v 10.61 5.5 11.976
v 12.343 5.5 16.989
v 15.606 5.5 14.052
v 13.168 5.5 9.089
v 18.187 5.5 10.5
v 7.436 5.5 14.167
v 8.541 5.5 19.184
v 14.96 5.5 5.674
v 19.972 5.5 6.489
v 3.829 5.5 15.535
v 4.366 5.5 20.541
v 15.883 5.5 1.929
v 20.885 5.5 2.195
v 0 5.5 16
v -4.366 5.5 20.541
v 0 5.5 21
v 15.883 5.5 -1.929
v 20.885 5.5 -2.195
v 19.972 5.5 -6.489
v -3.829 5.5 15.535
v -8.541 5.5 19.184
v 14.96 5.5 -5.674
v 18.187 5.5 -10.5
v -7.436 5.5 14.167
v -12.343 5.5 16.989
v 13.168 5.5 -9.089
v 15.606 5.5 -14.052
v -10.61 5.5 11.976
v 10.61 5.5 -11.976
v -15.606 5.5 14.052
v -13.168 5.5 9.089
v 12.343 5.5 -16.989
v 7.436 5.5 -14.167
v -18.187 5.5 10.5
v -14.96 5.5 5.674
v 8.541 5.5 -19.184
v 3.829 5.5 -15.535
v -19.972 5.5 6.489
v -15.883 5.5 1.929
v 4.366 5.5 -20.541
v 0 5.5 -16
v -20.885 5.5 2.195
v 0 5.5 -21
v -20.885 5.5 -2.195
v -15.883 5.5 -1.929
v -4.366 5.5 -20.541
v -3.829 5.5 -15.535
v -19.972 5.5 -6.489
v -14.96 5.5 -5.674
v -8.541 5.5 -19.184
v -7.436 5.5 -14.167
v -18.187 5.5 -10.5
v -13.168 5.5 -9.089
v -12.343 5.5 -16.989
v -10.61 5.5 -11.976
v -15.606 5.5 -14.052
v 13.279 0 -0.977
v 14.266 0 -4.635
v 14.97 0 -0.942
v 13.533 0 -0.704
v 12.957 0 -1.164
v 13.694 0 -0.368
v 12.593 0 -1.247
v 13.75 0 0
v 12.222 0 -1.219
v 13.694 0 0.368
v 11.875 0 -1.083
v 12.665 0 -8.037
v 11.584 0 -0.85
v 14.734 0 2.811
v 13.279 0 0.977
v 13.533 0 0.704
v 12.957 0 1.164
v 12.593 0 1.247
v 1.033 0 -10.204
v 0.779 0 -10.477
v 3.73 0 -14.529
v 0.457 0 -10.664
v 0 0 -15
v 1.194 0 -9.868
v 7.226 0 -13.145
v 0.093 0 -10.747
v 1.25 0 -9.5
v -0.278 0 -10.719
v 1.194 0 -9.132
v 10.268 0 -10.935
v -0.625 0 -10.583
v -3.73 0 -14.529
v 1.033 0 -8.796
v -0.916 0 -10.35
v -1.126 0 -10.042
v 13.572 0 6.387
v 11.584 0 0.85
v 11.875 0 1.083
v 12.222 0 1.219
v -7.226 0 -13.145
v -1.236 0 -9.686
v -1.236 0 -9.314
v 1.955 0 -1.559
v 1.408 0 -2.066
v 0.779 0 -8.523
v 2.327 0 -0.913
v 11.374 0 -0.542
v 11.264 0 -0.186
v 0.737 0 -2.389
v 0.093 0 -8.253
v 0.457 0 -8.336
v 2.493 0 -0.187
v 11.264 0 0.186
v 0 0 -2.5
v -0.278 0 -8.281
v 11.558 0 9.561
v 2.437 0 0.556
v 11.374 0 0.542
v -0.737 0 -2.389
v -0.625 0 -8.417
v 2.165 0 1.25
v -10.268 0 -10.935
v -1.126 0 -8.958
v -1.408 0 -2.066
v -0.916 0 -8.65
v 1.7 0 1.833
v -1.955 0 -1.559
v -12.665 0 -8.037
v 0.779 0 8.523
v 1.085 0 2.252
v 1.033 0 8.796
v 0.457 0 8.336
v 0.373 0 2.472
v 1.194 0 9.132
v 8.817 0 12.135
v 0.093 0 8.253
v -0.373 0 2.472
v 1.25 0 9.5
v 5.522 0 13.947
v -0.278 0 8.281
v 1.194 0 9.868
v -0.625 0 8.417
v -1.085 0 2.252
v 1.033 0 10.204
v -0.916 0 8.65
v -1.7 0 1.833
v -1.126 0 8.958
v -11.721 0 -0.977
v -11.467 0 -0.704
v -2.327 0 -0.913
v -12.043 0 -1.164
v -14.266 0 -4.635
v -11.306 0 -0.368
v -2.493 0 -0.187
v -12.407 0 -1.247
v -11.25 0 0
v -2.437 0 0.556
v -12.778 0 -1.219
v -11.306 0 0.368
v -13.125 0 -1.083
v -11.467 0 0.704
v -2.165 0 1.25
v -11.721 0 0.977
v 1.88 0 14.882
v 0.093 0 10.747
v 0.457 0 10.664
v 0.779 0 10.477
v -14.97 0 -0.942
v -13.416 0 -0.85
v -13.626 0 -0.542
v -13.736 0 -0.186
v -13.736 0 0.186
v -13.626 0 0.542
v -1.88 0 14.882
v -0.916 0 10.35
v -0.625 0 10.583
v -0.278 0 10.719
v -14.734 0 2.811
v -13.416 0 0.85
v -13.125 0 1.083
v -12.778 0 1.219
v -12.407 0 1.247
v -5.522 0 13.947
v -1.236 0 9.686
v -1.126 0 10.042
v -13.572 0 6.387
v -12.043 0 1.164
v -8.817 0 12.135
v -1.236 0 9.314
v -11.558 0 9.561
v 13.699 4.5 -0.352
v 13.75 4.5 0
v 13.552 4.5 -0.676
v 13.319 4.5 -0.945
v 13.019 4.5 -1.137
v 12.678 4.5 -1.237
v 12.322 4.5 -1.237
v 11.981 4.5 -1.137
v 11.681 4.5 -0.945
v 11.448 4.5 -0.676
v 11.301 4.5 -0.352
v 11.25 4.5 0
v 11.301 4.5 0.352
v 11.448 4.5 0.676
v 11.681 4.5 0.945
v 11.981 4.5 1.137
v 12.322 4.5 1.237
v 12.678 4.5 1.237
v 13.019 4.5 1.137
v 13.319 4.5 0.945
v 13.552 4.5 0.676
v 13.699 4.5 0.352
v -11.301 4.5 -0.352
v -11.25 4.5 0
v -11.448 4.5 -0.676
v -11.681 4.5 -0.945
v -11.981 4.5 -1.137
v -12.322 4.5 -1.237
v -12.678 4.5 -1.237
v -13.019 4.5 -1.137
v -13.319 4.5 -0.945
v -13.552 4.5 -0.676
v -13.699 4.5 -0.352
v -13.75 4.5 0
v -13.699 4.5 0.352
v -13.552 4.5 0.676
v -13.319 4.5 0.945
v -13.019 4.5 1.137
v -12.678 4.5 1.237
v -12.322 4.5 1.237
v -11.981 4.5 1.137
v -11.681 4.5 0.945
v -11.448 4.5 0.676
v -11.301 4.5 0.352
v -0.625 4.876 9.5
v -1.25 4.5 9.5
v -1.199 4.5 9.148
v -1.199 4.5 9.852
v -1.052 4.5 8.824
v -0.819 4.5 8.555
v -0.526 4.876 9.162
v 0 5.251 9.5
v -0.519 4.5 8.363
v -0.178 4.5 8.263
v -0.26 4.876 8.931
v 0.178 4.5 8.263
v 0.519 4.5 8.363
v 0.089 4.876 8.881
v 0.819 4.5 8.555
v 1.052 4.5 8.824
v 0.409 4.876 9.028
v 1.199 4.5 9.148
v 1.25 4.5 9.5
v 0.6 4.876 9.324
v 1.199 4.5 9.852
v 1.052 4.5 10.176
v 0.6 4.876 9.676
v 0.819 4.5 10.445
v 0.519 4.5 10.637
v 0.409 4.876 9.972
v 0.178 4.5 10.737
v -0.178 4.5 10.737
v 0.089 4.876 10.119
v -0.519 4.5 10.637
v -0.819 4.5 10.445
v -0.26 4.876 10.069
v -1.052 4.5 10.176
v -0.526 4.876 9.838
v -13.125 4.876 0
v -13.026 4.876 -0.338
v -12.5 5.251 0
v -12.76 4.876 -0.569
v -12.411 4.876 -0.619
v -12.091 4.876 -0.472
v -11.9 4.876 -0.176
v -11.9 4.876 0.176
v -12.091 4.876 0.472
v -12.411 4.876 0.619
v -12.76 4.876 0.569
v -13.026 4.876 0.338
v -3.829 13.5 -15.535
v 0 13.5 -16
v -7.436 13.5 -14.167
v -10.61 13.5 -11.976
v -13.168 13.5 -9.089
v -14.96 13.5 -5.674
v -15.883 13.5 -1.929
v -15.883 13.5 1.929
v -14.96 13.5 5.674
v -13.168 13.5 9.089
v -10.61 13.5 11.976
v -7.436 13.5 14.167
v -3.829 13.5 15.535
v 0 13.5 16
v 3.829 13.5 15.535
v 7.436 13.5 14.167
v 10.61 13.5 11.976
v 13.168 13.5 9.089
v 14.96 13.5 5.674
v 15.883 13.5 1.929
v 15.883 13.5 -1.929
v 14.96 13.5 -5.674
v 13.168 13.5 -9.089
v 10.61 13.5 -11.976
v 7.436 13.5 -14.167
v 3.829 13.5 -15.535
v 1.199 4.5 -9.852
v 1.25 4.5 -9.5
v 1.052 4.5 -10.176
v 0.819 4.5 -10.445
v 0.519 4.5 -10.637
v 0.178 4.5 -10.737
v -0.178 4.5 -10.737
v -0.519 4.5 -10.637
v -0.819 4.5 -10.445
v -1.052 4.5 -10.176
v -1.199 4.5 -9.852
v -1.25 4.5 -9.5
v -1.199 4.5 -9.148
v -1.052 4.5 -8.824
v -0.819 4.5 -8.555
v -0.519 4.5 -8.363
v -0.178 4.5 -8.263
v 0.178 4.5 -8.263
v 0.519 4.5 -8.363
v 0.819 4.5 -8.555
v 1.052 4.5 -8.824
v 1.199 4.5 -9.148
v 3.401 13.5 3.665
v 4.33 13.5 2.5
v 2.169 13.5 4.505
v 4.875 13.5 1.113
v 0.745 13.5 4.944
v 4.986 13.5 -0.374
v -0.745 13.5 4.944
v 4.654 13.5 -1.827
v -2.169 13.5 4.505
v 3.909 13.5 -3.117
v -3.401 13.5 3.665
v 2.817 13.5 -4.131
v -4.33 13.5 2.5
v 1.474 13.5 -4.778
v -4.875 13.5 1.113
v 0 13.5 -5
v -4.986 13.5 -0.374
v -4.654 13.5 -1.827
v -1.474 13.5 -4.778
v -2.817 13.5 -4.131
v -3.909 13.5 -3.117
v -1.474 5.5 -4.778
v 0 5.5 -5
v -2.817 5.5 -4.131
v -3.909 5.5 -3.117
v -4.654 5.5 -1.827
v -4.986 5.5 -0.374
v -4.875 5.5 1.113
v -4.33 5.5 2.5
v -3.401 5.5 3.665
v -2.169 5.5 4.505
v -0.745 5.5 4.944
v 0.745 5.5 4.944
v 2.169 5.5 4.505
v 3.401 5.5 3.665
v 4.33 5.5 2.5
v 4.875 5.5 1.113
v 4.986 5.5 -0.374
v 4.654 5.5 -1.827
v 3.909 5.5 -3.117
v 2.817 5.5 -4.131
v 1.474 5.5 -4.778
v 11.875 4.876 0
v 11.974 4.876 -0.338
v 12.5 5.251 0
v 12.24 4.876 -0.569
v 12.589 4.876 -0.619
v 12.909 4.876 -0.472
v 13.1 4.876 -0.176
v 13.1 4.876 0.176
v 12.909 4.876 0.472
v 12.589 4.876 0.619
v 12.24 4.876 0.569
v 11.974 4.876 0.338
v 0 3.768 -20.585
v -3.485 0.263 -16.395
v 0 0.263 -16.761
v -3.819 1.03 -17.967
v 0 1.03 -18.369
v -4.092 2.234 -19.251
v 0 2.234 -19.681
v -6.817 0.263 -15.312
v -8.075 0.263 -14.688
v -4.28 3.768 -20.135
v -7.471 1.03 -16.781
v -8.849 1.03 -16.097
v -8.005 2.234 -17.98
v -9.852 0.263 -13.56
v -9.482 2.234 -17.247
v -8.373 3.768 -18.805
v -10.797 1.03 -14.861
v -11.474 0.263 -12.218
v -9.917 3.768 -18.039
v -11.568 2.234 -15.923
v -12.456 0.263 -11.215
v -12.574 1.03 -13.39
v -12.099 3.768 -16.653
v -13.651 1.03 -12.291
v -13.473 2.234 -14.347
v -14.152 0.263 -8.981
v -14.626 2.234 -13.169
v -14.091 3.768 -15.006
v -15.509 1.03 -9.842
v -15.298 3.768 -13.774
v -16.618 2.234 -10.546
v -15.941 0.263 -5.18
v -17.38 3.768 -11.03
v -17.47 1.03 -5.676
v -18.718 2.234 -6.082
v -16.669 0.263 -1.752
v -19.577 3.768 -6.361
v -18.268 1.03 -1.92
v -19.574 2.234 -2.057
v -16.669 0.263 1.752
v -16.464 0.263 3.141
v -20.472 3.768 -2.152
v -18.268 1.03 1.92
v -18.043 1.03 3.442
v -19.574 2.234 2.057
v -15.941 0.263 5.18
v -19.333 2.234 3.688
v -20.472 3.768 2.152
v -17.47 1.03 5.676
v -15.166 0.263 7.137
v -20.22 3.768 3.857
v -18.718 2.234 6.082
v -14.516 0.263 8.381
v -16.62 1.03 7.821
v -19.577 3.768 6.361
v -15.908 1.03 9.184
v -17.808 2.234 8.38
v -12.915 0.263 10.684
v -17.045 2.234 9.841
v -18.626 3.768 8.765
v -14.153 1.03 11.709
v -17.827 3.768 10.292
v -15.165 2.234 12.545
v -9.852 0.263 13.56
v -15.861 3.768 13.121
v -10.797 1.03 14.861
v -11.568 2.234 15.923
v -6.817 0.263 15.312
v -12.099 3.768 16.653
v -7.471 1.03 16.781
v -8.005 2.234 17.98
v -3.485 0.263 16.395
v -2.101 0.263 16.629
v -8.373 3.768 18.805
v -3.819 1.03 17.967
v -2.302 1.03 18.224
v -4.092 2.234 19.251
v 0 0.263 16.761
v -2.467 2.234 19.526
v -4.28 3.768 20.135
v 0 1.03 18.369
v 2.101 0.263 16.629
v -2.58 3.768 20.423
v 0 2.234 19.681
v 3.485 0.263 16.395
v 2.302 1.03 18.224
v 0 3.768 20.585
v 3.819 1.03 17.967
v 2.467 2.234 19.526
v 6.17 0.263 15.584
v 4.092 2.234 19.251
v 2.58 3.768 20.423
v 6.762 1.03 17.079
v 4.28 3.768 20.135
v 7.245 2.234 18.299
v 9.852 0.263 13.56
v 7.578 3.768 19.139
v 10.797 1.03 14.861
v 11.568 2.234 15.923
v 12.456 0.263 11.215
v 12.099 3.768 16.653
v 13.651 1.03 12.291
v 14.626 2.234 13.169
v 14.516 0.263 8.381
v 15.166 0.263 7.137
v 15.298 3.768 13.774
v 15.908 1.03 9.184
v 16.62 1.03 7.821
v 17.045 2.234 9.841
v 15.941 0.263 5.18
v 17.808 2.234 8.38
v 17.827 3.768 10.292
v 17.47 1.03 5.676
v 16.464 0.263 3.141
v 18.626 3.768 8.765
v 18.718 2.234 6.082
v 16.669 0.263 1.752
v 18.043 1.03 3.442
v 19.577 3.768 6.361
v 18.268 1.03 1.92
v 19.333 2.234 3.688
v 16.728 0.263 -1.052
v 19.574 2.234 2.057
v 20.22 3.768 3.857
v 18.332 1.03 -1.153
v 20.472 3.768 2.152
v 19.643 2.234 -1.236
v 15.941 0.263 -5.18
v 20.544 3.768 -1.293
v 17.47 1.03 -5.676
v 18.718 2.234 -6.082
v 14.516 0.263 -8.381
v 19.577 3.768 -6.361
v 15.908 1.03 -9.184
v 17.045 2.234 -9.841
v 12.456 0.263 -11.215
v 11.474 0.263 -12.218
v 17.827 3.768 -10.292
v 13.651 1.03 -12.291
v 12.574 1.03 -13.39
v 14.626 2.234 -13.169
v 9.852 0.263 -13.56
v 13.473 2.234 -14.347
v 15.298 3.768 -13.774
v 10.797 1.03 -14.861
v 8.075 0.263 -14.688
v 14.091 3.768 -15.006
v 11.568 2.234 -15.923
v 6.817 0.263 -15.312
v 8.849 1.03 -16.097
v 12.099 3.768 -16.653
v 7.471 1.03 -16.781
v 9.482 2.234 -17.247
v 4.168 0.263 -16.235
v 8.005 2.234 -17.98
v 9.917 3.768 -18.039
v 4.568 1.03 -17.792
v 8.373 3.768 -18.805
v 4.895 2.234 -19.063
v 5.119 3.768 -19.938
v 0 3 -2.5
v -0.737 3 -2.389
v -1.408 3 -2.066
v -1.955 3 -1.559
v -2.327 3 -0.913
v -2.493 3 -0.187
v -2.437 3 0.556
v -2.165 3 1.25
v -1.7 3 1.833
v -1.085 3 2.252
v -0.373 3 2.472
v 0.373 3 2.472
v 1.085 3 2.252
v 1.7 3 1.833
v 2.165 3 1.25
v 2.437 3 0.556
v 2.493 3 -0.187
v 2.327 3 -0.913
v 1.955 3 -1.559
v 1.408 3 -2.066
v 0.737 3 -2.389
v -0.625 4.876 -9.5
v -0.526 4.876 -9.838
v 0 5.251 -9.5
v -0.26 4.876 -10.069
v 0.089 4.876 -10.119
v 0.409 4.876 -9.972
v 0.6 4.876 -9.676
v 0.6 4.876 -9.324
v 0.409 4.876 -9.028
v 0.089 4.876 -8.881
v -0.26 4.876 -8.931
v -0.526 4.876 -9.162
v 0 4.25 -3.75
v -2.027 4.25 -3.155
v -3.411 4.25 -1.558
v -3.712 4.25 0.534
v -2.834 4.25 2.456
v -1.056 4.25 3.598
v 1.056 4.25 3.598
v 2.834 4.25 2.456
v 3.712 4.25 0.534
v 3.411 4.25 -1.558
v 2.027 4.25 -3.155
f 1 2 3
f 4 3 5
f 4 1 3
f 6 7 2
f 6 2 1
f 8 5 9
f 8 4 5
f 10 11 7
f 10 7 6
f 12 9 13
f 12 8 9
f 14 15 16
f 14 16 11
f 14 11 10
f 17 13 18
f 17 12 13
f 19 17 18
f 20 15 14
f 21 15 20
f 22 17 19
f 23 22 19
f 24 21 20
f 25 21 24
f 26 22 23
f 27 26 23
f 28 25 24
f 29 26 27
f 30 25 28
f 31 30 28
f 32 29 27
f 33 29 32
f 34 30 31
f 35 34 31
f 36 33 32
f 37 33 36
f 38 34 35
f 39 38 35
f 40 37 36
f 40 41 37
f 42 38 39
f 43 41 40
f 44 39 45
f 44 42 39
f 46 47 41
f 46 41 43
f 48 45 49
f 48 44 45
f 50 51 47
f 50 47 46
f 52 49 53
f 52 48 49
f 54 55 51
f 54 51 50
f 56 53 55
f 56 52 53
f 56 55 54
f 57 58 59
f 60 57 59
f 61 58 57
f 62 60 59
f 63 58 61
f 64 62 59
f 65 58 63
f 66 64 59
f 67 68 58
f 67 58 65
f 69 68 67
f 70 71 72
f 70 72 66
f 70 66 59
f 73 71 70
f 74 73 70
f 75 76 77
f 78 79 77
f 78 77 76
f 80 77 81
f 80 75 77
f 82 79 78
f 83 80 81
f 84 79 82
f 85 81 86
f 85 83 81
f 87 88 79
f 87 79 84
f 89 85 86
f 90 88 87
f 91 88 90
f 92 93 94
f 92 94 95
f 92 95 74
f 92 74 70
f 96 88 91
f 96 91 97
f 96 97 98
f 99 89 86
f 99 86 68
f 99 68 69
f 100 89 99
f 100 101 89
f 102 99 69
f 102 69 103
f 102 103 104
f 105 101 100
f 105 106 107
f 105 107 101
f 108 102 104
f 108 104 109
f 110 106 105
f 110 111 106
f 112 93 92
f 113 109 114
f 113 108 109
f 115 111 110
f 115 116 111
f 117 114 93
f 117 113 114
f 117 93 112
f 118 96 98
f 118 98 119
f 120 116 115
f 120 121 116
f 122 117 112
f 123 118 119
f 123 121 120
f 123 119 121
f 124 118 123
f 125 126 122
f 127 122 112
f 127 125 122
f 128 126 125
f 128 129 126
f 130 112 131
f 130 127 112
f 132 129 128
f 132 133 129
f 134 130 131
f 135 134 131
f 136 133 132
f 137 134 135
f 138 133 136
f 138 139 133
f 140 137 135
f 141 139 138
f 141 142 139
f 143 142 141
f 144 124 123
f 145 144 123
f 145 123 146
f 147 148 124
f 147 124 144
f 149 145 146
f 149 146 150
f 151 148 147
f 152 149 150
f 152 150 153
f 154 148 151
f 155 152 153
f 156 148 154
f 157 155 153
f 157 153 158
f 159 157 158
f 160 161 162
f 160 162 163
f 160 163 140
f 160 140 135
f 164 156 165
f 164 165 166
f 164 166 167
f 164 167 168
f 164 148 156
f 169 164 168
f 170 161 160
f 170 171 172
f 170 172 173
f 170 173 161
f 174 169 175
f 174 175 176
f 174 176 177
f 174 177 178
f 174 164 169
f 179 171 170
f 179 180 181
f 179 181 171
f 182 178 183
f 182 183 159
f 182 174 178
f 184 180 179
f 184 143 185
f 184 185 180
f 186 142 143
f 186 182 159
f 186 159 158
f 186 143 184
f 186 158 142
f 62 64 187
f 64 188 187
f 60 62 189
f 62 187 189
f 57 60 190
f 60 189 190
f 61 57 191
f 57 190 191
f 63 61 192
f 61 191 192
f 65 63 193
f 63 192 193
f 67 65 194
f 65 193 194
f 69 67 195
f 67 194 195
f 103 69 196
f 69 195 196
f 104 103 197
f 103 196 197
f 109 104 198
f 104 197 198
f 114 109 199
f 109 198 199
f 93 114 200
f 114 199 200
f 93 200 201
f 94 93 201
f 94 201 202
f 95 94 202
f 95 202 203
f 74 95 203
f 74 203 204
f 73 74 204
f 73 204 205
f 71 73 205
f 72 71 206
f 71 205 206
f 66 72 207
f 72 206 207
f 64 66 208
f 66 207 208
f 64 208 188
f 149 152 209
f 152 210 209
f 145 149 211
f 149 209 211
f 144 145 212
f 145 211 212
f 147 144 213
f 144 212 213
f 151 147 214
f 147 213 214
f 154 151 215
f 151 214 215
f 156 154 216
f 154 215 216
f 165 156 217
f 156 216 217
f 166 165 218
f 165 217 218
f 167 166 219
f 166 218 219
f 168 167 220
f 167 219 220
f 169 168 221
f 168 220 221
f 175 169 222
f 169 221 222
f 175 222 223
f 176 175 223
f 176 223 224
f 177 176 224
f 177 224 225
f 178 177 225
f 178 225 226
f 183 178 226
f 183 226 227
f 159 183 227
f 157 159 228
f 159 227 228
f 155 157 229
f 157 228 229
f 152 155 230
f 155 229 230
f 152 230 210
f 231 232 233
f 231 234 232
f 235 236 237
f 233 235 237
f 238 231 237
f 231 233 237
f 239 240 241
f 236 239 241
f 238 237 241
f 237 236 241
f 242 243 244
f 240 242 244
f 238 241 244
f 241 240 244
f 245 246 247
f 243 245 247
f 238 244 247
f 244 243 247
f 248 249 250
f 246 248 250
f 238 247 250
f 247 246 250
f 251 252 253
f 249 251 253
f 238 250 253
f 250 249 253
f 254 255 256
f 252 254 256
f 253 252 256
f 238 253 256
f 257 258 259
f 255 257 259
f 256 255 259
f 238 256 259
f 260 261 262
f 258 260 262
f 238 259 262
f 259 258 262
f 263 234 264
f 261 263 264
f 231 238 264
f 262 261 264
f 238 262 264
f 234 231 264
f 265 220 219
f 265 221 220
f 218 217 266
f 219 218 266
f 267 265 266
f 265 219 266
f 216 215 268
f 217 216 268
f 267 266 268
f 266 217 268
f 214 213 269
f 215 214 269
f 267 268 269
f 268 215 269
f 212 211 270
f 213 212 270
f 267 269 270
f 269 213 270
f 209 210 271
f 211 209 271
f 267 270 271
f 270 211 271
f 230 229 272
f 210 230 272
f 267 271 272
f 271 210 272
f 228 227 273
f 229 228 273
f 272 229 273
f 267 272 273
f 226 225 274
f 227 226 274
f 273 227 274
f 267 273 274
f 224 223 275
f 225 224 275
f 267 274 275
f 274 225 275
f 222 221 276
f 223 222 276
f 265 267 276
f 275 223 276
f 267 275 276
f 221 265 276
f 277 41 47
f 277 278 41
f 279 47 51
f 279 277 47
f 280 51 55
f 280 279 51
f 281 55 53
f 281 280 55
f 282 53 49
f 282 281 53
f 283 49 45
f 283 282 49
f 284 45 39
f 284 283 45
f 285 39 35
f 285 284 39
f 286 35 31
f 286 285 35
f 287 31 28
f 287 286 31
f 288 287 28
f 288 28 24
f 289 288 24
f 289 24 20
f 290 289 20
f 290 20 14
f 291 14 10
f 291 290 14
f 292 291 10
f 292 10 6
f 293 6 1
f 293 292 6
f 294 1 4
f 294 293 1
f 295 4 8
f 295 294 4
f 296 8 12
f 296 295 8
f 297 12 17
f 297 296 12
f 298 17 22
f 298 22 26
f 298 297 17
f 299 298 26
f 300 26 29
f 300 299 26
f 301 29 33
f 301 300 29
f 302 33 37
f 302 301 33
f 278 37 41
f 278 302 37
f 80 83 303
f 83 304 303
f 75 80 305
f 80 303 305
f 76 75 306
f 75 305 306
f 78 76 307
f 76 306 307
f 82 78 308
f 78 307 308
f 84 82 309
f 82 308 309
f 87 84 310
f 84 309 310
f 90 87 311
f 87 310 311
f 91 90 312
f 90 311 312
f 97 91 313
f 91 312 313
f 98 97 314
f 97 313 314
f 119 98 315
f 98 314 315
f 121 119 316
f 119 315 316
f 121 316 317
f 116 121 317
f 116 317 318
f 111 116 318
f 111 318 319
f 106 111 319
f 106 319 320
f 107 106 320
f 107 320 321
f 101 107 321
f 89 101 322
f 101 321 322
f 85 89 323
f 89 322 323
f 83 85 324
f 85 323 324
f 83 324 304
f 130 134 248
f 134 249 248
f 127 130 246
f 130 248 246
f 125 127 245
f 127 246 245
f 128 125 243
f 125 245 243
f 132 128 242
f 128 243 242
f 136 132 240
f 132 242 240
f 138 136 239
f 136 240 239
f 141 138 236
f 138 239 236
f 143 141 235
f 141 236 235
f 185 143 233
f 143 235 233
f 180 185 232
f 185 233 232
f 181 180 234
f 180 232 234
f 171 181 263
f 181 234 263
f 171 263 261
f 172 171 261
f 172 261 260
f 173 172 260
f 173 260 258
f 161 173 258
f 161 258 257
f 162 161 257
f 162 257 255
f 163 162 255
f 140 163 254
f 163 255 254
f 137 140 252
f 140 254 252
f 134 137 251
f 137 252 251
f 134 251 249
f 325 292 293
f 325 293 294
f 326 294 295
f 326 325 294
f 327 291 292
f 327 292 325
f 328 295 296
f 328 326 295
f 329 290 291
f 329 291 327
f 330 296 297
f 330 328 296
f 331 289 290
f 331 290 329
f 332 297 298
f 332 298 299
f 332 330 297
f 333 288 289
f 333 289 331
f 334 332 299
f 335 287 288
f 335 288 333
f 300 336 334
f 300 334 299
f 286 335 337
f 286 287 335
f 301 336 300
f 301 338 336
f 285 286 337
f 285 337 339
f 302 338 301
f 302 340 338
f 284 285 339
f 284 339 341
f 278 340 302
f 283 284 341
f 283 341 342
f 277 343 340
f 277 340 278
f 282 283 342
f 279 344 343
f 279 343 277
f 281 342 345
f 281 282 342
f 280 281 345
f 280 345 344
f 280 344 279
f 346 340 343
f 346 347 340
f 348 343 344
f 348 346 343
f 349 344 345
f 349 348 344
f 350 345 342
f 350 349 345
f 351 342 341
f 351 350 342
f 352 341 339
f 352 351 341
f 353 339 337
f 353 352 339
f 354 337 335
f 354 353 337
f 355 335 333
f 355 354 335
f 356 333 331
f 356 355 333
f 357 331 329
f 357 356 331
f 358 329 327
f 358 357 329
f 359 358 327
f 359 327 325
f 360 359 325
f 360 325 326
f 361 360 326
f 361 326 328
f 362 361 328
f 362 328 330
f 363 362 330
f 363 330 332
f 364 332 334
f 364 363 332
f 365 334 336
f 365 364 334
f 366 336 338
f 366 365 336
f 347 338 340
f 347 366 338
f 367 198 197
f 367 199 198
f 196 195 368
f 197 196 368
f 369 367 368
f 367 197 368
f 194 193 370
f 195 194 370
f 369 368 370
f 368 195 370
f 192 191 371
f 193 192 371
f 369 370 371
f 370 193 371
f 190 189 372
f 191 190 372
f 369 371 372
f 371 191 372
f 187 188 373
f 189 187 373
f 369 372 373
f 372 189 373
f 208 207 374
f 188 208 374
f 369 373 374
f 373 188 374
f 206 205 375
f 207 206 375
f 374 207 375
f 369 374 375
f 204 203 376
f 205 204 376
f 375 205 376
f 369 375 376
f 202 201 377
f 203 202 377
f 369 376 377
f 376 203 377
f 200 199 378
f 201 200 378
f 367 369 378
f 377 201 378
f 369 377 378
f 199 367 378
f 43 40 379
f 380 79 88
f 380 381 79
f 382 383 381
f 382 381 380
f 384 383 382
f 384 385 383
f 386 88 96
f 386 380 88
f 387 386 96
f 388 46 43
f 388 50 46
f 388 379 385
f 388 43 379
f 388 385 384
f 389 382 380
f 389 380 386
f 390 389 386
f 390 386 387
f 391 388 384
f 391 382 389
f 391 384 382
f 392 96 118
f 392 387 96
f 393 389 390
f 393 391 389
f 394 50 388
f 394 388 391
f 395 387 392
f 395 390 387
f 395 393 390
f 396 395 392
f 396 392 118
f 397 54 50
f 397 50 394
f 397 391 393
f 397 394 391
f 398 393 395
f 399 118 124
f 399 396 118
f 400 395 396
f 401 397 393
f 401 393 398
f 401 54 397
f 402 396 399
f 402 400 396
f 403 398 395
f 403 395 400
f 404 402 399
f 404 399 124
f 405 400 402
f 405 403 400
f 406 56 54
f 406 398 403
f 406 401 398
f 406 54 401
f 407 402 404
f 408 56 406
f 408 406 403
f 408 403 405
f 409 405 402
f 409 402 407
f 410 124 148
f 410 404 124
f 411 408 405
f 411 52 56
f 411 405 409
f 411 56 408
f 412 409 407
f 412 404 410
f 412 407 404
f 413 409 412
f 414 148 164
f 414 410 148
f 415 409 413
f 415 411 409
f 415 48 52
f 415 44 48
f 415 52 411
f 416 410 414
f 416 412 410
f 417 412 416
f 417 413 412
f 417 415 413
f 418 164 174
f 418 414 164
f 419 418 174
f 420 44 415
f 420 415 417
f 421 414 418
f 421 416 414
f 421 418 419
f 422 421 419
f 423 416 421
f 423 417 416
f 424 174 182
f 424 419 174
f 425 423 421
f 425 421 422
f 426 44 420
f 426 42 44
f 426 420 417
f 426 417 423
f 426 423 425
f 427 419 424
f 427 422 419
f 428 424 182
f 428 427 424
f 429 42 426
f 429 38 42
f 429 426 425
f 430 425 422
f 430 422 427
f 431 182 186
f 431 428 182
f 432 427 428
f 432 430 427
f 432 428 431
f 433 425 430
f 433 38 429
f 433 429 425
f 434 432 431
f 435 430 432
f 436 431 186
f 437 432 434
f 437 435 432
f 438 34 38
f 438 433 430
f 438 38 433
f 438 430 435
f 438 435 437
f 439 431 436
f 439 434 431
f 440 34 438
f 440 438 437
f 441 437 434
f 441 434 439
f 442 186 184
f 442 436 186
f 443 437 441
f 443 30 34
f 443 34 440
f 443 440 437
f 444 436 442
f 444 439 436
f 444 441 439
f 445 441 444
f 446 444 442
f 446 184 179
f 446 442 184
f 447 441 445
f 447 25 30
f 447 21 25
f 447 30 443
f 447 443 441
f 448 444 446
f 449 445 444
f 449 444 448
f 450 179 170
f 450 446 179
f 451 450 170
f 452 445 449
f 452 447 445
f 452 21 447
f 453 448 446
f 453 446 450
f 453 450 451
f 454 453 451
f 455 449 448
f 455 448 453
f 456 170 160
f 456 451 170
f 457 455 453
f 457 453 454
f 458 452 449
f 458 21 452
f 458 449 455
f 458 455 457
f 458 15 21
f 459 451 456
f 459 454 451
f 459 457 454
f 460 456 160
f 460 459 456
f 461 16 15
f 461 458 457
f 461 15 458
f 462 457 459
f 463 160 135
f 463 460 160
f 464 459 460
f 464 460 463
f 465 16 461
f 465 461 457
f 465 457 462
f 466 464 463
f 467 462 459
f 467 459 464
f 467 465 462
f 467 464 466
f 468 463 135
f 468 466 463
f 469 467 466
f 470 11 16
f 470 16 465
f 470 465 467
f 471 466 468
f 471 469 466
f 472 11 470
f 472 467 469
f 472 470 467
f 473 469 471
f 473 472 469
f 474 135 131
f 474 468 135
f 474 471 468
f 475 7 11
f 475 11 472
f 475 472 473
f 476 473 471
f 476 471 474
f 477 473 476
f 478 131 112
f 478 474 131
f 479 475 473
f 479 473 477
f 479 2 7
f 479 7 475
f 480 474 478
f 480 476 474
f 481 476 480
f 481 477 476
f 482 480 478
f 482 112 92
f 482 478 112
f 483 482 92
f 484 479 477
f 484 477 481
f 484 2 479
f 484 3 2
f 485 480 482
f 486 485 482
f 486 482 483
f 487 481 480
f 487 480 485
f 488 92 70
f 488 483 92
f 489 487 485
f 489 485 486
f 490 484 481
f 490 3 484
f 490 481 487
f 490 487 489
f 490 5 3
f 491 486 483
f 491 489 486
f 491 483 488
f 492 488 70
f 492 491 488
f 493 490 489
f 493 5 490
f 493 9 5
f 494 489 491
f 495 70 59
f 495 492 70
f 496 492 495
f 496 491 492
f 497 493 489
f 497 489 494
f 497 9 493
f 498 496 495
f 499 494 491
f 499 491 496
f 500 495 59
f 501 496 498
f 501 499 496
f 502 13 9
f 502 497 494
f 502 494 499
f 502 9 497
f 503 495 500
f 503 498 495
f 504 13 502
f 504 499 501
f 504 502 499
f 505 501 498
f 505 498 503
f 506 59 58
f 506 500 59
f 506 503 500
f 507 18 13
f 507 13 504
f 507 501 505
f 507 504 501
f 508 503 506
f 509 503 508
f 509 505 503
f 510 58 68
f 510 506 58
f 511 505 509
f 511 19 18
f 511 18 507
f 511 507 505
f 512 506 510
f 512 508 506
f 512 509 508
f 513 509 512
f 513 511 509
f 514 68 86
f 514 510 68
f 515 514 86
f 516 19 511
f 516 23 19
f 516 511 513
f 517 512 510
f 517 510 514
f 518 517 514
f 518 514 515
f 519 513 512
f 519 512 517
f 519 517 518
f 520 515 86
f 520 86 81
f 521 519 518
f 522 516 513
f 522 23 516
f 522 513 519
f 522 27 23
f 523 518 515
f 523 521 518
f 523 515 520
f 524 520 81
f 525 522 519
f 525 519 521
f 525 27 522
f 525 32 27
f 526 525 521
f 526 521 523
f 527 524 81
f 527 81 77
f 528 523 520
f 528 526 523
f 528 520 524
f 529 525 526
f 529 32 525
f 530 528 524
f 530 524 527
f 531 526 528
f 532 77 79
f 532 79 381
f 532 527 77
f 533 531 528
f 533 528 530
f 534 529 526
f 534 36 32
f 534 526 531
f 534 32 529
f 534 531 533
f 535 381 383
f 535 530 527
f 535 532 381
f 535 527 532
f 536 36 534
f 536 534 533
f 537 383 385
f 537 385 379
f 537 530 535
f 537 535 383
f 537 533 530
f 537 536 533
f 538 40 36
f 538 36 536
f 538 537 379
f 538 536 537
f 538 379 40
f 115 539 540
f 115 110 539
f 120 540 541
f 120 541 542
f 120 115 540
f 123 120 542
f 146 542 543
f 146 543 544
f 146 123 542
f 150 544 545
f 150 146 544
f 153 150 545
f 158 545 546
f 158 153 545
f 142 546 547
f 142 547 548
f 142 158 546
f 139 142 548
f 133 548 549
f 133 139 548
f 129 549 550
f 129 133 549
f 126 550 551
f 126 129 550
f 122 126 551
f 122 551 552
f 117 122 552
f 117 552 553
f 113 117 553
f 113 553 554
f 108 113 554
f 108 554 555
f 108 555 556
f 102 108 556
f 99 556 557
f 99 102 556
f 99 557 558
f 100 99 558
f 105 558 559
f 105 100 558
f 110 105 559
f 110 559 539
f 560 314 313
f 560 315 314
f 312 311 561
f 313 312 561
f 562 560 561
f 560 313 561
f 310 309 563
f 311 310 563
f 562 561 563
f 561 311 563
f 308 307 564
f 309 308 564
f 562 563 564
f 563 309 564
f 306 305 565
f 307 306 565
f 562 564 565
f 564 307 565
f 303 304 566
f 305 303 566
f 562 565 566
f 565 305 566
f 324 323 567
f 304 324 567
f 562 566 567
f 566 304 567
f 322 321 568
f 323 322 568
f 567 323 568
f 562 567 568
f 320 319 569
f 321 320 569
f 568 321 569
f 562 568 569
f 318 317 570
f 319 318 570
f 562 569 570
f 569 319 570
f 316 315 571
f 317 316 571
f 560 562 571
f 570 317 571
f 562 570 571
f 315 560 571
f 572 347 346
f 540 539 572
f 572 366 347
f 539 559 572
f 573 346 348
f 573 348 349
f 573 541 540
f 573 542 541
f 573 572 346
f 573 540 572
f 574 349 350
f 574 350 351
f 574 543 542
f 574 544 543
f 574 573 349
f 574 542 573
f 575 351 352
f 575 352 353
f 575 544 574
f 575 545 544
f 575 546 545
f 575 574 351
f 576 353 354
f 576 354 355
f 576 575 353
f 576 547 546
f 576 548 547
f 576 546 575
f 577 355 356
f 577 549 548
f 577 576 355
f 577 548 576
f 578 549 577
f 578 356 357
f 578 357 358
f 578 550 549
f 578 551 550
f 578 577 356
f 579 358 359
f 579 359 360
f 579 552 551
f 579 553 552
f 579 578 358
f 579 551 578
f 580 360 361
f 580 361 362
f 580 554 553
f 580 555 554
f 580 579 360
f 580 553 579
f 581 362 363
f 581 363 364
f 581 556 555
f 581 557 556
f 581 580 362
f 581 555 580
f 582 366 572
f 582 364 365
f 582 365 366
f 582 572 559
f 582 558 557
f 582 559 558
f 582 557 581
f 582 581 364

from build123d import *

# Parameters (mm, degrees)
M3X0_5_TAPPED_HOLE1_D     = 2.5
M3X0_5_TAPPED_HOLE1_DEPTH = 4.5
M3X0_5_TAPPED_HOLE1_TIP   = 0.751075774


with BuildPart() as part:
    # Sketch1 → Revolve1 (revolve)
    with BuildSketch(Plane.XY, mode=Mode.PRIVATE) as revolve1_sk:
        with BuildLine():
            Line((-2.5, 0), (-15, 0))
            ThreePointArc((-15, 0), (-19.069705149, 1.583048928), (-21, 5.5))
            Line((-21, 5.5), (-16, 5.5))
            Line((-16, 5.5), (-16, 13.5))
            Line((-16, 13.5), (-5, 13.5))
            Line((-5, 13.5), (-5, 5.5))
            Line((-5, 5.5), (-2.5, 3))
            Line((-2.5, 3), (-2.5, 0))
        make_face()
    revolve(revolve1_sk.sketch.rotate(Axis((0, 0, 0), (0, 1, 0)), 270), axis=Axis((0, 0, 0), (0, 1, 0)))

    # M3x0.5 Tapped Hole1
    with Locations(Plane(origin=(0, 0, 0), x_dir=(-1, 0, 0), z_dir=(0, -1, 0))):
        with Locations((12.5, 0), (0, 9.5), (-12.5, 0), (0, -9.5)):
            Hole(M3X0_5_TAPPED_HOLE1_D / 2, depth=M3X0_5_TAPPED_HOLE1_DEPTH)
            with Locations((0, 0, -(M3X0_5_TAPPED_HOLE1_DEPTH + M3X0_5_TAPPED_HOLE1_TIP / 2))):  # 118° drill point
                Cone(0, M3X0_5_TAPPED_HOLE1_D / 2, M3X0_5_TAPPED_HOLE1_TIP, mode=Mode.SUBTRACT)


solid = part.part
